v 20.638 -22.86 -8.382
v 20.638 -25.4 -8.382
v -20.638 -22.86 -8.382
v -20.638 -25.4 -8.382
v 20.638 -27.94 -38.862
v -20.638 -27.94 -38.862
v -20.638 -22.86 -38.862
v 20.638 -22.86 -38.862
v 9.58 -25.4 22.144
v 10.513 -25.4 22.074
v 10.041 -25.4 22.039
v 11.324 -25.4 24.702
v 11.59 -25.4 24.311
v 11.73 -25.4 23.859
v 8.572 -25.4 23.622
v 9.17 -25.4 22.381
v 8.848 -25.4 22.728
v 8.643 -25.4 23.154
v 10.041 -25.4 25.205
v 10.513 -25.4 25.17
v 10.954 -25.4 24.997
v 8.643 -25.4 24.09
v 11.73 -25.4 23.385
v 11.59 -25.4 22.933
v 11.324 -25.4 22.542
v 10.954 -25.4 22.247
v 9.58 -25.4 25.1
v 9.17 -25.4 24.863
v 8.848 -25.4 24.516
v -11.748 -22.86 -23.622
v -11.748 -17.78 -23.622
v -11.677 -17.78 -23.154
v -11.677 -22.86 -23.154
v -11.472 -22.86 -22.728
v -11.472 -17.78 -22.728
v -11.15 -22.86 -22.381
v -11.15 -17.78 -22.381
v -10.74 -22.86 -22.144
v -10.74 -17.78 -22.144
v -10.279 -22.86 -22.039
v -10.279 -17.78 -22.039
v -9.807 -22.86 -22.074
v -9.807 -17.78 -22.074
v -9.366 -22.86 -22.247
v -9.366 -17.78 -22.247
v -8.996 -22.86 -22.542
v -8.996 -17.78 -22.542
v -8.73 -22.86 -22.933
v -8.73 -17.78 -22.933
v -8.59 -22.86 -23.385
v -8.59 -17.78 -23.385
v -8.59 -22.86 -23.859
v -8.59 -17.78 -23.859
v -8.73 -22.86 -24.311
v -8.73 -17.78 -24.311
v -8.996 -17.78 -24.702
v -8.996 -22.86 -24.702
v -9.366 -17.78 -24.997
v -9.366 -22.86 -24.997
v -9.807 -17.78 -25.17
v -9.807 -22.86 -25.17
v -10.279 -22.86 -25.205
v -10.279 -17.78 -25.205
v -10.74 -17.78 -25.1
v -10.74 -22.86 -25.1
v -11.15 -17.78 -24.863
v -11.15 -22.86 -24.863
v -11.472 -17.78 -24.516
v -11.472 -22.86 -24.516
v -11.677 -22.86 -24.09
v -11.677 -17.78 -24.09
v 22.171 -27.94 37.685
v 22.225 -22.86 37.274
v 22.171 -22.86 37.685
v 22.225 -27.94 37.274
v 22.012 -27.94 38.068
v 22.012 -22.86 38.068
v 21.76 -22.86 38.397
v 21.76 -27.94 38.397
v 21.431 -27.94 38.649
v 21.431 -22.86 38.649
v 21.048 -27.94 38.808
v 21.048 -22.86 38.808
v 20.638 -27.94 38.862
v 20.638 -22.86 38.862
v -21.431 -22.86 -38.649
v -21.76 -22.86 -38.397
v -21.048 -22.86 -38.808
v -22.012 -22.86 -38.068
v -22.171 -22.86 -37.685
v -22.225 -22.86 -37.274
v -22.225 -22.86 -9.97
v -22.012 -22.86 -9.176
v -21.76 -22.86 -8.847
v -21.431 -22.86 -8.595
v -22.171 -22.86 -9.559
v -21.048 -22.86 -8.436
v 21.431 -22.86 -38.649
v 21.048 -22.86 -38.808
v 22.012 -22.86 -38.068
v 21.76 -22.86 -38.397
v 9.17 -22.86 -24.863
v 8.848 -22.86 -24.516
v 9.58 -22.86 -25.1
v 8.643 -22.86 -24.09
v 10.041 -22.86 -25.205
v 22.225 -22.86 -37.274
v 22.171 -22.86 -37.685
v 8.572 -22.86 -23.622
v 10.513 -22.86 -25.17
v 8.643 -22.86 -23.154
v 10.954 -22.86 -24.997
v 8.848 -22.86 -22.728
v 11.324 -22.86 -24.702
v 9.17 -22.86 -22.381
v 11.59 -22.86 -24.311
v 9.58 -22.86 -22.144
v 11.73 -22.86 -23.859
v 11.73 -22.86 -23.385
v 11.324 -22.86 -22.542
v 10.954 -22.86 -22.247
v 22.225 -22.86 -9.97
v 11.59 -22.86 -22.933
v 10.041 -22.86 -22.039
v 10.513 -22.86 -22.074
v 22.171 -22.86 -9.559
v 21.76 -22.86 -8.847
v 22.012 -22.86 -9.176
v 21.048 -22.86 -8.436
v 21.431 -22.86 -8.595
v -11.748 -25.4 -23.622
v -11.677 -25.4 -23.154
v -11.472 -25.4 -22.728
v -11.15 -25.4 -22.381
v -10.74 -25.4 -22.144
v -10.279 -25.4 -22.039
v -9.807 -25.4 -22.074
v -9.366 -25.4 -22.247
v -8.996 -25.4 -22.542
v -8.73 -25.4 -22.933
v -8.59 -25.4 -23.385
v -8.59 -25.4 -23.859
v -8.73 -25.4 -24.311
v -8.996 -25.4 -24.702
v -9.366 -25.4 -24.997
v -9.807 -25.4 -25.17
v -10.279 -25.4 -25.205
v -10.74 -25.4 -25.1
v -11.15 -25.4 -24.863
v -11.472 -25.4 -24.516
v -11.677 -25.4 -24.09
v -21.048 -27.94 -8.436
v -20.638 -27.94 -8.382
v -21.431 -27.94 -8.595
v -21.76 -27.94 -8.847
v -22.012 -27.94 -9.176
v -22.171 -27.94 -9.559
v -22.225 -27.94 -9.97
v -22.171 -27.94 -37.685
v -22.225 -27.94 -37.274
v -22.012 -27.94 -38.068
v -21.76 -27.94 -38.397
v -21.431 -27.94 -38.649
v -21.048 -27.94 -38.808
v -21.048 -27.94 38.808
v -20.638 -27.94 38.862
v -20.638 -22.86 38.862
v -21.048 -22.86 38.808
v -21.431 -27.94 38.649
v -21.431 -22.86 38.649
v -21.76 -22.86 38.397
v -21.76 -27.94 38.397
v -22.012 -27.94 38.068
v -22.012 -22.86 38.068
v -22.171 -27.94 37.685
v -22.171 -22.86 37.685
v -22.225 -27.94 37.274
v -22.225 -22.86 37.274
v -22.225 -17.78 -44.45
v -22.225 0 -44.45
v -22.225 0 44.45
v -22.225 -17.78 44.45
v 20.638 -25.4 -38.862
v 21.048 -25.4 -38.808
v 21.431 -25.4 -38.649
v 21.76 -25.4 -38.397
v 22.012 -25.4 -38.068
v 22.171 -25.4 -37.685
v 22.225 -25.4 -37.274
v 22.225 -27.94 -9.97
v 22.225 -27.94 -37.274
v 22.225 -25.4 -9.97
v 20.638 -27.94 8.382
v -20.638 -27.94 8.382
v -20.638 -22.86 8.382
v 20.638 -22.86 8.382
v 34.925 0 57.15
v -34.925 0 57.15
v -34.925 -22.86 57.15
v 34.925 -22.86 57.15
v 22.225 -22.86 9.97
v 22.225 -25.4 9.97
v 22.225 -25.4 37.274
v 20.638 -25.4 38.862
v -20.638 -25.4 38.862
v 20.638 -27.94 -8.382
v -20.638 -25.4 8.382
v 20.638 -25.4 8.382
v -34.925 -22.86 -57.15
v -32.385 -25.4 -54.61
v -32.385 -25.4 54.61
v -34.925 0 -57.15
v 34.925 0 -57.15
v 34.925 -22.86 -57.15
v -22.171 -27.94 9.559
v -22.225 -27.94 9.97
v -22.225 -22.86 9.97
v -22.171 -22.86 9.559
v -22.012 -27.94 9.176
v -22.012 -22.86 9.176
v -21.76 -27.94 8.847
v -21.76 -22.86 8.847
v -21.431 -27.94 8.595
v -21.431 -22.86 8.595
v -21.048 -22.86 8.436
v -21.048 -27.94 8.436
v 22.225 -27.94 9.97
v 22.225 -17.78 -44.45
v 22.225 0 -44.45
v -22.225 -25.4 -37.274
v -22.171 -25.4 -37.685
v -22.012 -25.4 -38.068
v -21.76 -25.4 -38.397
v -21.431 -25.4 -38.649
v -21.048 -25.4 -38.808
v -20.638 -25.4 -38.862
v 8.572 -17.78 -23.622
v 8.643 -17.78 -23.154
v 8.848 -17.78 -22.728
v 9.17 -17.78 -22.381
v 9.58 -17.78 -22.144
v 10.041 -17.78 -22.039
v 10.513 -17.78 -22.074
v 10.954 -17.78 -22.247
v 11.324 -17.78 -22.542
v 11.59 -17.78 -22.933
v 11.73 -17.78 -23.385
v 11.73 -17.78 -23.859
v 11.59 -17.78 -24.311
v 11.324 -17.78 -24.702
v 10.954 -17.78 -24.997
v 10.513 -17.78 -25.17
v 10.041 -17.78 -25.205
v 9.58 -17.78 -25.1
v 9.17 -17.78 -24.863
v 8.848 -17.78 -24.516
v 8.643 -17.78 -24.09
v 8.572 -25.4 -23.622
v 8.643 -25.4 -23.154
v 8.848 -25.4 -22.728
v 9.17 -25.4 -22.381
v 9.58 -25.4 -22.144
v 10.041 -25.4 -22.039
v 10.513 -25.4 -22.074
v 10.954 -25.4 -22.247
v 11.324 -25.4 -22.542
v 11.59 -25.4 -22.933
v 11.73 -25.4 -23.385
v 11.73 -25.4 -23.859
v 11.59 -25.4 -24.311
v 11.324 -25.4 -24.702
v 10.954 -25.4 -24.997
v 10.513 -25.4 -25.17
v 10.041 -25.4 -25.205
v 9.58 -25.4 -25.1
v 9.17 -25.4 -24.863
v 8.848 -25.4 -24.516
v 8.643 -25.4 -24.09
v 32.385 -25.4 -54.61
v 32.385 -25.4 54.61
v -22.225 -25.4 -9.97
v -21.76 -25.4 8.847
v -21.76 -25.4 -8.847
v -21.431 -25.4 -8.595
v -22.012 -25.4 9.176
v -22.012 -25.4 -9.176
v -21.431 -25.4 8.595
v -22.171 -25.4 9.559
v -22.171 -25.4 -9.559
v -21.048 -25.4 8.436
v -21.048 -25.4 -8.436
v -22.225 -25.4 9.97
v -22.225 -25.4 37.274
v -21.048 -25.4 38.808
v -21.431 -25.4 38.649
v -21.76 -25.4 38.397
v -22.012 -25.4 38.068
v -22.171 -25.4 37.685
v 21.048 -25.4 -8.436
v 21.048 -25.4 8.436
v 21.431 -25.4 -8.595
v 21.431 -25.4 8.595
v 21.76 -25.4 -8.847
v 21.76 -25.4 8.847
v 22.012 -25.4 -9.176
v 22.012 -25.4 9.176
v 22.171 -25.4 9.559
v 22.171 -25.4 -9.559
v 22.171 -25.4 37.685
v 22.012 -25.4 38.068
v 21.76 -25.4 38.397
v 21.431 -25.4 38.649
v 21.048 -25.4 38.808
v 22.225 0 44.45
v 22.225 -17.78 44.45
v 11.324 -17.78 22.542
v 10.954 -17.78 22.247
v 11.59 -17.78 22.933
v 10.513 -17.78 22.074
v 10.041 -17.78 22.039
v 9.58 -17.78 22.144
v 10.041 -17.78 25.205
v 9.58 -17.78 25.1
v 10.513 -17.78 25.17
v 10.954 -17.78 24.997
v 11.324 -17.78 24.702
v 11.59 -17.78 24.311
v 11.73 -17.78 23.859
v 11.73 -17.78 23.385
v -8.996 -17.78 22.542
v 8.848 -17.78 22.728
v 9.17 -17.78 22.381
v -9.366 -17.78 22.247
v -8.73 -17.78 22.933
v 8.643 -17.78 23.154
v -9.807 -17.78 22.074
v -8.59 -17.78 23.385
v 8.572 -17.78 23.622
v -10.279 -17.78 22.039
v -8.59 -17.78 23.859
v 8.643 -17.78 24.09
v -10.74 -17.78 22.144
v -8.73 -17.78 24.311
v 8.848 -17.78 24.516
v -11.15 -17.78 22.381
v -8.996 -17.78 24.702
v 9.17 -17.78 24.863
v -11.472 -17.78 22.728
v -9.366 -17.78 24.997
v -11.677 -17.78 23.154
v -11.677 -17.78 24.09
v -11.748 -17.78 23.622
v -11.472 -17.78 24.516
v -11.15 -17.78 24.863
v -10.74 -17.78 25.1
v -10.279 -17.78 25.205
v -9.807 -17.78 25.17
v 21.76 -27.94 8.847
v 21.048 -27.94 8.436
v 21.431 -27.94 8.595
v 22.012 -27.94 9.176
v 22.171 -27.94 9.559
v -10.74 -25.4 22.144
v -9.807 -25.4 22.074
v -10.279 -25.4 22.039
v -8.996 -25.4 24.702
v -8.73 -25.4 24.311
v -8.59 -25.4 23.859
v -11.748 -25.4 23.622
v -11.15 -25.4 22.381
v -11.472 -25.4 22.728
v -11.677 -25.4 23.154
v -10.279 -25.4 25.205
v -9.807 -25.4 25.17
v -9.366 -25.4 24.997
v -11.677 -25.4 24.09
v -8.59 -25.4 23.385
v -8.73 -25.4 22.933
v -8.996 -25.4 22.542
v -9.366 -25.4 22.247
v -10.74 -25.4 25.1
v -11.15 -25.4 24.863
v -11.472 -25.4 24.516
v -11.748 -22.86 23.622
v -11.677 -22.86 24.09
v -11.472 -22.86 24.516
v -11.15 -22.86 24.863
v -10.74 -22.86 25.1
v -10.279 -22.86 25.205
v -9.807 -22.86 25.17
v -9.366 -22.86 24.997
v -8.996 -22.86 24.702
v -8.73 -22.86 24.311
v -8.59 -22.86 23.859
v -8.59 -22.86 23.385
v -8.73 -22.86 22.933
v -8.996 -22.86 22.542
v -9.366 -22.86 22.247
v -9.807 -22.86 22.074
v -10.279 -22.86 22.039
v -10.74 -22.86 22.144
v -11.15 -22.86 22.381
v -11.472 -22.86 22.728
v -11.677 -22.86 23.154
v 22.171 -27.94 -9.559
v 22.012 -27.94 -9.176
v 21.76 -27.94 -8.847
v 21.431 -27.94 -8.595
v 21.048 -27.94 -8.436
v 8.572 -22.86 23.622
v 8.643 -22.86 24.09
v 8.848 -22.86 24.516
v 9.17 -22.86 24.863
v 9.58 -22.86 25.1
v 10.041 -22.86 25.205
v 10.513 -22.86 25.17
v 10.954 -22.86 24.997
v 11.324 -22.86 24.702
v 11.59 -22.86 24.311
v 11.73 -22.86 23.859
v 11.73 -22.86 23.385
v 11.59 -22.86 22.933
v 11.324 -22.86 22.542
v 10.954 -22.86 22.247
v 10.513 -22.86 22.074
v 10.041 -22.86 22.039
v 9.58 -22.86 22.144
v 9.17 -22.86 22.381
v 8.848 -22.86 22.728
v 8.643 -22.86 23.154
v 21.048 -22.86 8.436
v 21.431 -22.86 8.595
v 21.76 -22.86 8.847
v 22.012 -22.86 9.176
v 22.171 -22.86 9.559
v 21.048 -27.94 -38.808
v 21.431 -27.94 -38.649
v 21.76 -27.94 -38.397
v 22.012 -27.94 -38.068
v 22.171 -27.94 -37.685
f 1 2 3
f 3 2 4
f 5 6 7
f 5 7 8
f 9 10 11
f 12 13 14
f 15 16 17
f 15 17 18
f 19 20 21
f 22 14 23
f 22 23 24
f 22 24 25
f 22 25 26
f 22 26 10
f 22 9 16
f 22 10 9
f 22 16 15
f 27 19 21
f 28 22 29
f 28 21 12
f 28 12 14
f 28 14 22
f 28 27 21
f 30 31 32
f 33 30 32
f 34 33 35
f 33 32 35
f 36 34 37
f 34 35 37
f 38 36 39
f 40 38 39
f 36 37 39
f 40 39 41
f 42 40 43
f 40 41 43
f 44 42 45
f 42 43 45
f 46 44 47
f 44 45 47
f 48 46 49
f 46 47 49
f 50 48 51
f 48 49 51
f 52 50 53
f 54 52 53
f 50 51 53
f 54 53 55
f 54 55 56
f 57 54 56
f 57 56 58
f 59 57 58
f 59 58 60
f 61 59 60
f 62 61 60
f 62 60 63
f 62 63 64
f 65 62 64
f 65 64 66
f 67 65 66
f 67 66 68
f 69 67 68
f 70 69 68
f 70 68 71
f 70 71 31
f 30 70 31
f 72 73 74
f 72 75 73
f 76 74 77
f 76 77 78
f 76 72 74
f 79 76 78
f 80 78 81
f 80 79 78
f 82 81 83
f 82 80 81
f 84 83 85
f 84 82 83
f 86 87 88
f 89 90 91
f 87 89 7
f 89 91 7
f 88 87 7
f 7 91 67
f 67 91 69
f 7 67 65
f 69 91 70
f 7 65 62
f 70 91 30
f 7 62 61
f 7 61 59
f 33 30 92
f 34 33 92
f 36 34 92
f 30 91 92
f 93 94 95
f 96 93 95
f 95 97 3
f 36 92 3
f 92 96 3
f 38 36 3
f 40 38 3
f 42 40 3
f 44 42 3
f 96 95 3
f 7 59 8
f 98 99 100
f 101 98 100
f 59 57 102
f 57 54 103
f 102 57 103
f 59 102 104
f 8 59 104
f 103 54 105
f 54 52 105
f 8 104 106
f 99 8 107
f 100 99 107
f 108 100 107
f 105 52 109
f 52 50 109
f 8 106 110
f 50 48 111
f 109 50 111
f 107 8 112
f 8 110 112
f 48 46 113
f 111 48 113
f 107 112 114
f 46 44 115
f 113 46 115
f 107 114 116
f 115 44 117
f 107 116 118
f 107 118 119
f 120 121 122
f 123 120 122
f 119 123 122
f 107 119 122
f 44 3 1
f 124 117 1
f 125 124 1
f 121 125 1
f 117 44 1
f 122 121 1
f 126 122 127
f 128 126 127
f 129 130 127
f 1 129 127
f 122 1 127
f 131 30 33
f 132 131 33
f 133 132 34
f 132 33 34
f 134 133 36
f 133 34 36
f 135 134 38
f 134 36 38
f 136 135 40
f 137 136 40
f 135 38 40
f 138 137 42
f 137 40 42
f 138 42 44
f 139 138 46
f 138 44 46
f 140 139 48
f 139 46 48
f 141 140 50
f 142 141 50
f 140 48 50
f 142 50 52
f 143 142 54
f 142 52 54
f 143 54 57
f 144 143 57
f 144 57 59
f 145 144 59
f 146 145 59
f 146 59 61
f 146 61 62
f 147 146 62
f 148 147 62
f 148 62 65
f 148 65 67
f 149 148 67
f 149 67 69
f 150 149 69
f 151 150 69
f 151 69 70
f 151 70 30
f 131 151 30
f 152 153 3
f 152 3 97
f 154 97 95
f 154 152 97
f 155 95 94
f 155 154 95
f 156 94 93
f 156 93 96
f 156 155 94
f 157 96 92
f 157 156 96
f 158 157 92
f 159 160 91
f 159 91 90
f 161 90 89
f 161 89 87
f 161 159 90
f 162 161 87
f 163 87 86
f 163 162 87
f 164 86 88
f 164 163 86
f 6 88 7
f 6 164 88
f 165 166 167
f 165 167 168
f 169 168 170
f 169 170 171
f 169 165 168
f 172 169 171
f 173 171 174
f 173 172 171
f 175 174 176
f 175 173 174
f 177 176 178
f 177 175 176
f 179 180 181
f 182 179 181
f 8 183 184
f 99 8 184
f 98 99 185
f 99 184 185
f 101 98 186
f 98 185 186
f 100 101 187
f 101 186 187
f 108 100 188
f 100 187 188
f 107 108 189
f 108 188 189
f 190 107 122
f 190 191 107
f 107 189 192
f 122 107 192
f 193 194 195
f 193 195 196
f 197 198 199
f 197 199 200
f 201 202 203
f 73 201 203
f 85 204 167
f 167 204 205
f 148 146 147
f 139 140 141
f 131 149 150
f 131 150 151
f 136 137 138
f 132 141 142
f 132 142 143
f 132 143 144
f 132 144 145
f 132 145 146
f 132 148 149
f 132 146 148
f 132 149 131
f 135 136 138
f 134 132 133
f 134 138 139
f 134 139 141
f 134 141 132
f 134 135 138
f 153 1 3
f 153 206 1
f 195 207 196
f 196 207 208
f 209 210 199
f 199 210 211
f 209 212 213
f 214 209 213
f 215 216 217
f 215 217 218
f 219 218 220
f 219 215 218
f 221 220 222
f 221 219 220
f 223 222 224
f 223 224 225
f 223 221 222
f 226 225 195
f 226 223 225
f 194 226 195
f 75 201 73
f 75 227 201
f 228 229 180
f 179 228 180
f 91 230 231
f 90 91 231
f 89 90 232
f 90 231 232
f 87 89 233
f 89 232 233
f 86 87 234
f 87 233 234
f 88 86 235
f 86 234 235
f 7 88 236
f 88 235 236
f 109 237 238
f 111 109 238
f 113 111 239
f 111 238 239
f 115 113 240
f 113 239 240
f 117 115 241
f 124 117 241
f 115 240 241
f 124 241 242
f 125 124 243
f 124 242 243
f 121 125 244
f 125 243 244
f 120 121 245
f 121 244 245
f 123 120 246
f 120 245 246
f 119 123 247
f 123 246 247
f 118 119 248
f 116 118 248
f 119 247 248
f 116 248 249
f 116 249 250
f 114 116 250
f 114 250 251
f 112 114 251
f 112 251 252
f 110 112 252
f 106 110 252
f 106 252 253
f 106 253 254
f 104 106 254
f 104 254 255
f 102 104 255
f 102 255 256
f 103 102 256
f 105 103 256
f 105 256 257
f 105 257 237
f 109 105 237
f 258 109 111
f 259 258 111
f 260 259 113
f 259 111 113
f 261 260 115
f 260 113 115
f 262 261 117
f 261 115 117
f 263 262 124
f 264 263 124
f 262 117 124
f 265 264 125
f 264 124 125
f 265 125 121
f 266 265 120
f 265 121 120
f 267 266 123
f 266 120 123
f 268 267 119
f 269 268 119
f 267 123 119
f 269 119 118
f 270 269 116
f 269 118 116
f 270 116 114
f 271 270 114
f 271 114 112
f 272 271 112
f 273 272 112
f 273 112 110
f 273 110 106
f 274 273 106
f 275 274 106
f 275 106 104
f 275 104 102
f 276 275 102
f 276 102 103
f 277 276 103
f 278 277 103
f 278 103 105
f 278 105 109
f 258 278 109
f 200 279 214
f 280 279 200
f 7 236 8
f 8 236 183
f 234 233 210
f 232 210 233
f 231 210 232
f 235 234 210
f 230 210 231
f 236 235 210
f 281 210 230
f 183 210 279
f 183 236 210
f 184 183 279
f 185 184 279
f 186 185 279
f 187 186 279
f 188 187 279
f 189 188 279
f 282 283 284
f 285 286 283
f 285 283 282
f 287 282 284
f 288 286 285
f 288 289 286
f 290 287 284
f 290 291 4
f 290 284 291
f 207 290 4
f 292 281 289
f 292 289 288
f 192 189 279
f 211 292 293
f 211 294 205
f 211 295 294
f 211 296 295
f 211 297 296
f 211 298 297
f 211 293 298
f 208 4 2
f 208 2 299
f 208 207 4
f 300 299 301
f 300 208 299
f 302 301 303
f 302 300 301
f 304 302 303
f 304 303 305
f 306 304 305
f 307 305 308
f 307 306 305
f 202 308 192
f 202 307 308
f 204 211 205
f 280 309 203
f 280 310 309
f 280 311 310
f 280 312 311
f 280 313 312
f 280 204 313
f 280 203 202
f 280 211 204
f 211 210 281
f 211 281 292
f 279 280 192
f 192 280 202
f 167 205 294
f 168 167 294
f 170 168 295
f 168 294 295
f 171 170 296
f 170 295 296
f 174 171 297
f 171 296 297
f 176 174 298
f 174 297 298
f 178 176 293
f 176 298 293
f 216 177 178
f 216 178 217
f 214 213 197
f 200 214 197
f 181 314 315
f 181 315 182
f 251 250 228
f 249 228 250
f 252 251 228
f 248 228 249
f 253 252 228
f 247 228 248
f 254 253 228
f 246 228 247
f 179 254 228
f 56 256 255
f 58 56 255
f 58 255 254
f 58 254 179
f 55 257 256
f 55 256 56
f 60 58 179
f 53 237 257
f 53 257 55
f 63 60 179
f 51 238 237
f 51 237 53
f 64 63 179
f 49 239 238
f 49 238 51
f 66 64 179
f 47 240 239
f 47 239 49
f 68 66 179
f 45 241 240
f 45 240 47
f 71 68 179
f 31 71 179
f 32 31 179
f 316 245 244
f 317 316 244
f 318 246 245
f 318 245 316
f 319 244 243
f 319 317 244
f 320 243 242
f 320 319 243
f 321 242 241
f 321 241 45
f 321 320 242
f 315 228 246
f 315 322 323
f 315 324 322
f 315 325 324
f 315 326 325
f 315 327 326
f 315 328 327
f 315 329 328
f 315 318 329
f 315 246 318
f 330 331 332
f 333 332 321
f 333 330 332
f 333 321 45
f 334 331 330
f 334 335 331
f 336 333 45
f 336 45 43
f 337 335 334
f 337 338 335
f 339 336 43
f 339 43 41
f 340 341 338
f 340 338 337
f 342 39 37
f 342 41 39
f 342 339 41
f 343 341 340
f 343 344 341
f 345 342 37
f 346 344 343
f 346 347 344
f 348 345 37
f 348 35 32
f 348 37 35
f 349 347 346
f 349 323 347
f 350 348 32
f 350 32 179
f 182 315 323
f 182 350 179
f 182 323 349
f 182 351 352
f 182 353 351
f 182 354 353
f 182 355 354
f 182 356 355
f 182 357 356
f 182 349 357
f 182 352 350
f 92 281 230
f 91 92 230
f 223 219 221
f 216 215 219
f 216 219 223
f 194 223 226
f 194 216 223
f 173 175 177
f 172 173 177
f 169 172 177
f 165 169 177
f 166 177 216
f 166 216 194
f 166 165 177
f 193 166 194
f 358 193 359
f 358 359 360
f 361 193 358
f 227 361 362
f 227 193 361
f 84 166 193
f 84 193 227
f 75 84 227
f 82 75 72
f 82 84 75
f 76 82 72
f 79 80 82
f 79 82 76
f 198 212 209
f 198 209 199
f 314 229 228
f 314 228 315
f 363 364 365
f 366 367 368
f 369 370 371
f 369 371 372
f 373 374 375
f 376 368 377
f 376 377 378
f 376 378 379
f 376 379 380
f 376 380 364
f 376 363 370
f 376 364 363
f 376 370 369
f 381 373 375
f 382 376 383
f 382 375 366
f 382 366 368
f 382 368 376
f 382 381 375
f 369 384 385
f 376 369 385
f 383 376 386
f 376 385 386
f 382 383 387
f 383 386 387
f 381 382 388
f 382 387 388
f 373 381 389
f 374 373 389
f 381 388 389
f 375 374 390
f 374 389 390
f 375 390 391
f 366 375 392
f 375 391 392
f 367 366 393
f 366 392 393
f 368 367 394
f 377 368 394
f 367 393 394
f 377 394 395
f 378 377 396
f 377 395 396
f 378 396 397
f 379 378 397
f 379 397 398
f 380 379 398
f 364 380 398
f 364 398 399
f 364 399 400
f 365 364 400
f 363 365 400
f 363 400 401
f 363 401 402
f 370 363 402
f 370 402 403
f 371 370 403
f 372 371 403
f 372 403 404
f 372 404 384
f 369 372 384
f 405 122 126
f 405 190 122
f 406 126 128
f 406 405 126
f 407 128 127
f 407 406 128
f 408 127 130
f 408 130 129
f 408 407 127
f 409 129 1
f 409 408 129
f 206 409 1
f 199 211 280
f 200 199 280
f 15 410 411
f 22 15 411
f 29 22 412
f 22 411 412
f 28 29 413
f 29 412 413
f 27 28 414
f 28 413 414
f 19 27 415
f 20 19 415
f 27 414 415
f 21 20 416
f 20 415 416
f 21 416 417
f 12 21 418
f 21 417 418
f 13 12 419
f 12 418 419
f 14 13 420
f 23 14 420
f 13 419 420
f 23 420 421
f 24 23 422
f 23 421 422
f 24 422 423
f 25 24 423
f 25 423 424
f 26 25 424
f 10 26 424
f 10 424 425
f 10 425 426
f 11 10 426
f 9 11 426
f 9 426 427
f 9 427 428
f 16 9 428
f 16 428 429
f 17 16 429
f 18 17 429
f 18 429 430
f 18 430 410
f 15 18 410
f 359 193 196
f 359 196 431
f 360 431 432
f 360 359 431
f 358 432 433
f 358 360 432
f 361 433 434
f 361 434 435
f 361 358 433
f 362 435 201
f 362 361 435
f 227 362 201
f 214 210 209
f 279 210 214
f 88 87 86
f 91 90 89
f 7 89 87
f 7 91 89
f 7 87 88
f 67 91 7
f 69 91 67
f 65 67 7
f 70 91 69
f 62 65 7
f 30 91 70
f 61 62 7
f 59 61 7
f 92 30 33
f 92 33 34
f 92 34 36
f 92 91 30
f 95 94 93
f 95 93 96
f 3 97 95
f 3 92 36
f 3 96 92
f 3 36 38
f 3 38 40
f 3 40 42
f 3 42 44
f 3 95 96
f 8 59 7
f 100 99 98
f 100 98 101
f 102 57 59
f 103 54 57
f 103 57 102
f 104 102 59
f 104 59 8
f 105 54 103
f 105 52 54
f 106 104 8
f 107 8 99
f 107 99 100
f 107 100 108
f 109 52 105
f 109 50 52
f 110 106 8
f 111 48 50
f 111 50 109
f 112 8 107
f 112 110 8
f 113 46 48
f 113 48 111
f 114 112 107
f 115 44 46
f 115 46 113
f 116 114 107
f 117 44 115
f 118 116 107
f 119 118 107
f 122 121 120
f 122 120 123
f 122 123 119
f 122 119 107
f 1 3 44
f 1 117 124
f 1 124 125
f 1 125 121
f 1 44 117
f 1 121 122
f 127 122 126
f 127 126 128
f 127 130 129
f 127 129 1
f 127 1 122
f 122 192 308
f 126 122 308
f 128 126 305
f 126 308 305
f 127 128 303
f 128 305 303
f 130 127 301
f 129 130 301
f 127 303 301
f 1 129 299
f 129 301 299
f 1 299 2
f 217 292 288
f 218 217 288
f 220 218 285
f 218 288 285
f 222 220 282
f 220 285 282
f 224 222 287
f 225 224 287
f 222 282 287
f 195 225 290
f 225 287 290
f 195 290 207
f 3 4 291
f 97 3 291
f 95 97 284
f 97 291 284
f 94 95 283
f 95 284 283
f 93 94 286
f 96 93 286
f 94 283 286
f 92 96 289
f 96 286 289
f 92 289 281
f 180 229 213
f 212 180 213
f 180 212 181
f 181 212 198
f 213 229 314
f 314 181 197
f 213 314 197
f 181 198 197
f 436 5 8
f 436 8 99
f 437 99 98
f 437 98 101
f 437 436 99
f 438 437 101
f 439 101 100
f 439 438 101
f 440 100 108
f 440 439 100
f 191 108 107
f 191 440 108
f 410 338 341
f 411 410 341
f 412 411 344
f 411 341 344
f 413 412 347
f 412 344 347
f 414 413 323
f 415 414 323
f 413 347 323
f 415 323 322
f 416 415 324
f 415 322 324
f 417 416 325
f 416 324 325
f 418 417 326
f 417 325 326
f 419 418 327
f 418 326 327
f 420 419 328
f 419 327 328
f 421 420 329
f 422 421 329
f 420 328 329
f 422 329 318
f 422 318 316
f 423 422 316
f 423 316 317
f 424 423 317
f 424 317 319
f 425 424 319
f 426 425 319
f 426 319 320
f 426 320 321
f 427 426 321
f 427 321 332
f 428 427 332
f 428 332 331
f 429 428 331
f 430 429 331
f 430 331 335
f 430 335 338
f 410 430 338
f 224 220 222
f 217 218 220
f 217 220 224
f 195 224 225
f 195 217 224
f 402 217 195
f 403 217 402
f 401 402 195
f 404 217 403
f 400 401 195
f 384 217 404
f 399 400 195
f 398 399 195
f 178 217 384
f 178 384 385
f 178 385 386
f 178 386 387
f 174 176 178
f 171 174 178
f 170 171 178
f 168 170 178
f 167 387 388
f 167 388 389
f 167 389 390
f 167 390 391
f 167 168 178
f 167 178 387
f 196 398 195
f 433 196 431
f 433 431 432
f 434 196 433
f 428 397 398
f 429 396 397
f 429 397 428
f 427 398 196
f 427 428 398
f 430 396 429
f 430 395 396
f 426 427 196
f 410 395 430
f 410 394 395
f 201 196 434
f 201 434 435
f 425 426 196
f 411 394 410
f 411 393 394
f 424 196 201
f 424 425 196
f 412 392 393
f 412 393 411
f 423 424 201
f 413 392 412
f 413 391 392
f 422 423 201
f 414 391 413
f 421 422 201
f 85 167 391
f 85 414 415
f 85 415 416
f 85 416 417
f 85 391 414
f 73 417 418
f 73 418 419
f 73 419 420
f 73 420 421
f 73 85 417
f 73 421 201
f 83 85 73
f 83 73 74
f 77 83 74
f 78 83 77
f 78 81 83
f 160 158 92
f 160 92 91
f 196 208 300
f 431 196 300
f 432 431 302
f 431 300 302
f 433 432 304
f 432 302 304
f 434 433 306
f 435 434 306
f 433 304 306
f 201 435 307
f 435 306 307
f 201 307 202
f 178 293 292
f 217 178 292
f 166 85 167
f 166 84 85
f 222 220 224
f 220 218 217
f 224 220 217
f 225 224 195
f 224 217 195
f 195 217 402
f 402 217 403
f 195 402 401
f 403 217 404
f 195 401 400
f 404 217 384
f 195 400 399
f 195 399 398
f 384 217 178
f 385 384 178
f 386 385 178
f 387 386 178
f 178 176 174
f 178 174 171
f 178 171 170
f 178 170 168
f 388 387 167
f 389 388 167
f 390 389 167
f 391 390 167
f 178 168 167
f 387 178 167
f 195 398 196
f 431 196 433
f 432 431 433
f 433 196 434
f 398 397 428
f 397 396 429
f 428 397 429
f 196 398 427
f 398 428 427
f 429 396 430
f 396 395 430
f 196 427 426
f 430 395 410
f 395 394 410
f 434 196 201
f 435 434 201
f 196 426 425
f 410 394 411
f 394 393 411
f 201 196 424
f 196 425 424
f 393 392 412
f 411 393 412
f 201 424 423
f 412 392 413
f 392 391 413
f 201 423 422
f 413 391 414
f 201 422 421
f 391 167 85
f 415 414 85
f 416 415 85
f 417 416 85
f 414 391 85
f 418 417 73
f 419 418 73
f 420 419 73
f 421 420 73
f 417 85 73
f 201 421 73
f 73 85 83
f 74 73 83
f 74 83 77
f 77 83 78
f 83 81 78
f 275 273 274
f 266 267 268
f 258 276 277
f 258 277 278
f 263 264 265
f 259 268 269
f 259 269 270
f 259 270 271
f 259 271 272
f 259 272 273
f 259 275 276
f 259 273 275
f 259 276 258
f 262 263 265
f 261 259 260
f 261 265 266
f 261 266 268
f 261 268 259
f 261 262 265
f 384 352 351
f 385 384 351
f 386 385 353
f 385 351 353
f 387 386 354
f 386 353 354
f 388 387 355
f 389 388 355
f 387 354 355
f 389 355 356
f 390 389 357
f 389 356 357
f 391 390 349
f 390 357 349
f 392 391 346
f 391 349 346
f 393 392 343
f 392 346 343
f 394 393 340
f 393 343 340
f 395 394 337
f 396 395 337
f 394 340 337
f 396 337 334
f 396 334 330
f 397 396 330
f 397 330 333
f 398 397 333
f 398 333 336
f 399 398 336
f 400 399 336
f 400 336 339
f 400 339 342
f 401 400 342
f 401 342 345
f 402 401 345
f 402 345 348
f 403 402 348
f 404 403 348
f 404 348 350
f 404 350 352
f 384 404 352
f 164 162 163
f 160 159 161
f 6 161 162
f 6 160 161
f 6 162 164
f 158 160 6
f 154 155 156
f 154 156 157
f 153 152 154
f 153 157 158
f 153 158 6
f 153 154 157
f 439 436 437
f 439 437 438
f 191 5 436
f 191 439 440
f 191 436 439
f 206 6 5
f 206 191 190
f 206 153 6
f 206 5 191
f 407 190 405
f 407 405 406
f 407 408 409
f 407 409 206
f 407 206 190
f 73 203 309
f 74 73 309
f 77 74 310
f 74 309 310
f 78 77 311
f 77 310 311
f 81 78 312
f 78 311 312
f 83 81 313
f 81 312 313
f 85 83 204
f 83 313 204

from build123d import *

# Parameters (mm, degrees)
F0_W      = 69.85
F0_H      = 114.3
F1_DEPTH  = 25.4
F2_SIZE   = 2.54
F4_DEPTH  = 2.54
F5_DEPTH  = 2.54
F6_DEPTH  = 2.54
F7_DEPTH  = 2.54
F8_W      = 44.45
F8_H      = 88.9
F9_DEPTH  = 17.78
F10_R     = 1.5875
F11_DEPTH = 7.62


with BuildPart() as f1:
    # F0 (on Front) → F1 (new body)
    with BuildSketch(Plane.XZ):
        Rectangle(F0_W, F0_H)
    extrude(amount=F1_DEPTH)

    # F2
    f2_edges = [f1.edges().sort_by_distance(p)[0] for p in [
        (-34.925, -25.4, 0),
        (0, -25.4, 57.15),
        (34.925, -25.4, 0),
        (0, -25.4, -57.15),
    ]]
    chamfer(f2_edges, length=F2_SIZE)

    # F3 (on face) → F4 (cut)
    with BuildSketch(Plane.XZ.offset(25.4)):
        with BuildLine():
            Line((20.6375, 38.862), (-20.6375, 38.862))
            ThreePointArc((-20.6375, 38.862), (-21.7600320151, 38.3970320151), (-22.225, 37.2745))
            Line((-22.225, 37.2745), (-22.225, 9.9695))
            ThreePointArc((-22.225, 9.9695), (-21.7600320151, 8.8469679849), (-20.6375, 8.382))
            Line((-20.6375, 8.382), (20.6375, 8.382))
            ThreePointArc((20.6375, 8.382), (21.7600320151, 8.8469679849), (22.225, 9.9695))
            Line((22.225, 9.9695), (22.225, 37.2745))
            ThreePointArc((22.225, 37.2745), (21.7600320151, 38.3970320151), (20.6375, 38.862))
        make_face()
        with BuildLine():
            Line((20.6375, -8.382), (-20.6375, -8.382))
            ThreePointArc((-20.6375, -8.382), (-21.7600320151, -8.8469679849), (-22.225, -9.9695))
            Line((-22.225, -9.9695), (-22.225, -37.2745))
            ThreePointArc((-22.225, -37.2745), (-21.7600320151, -38.3970320151), (-20.6375, -38.862))
            Line((-20.6375, -38.862), (20.6375, -38.862))
            ThreePointArc((20.6375, -38.862), (21.7600320151, -38.3970320151), (22.225, -37.2745))
            Line((22.225, -37.2745), (22.225, -9.9695))
            ThreePointArc((22.225, -9.9695), (21.7600320151, -8.8469679849), (20.6375, -8.382))
        make_face()
    extrude(amount=-F4_DEPTH, mode=Mode.SUBTRACT)

    # F8 (on face) → F9 (cut)
    with BuildSketch(Plane(origin=(0, 0, 0), x_dir=(-1, 0, 0), z_dir=(0, 1, 0))):
        Rectangle(F8_W, F8_H)
    extrude(amount=-F9_DEPTH, mode=Mode.SUBTRACT)


with BuildPart() as f5:
    # F3 (on face) → F5 (new body)
    with BuildSketch(Plane.XZ.offset(25.4)):
        with BuildLine():
            Line((20.6375, 38.862), (-20.6375, 38.862))
            ThreePointArc((-20.6375, 38.862), (-21.7600320151, 38.3970320151), (-22.225, 37.2745))
            Line((-22.225, 37.2745), (-22.225, 9.9695))
            ThreePointArc((-22.225, 9.9695), (-21.7600320151, 8.8469679849), (-20.6375, 8.382))
            Line((-20.6375, 8.382), (20.6375, 8.382))
            ThreePointArc((20.6375, 8.382), (21.7600320151, 8.8469679849), (22.225, 9.9695))
            Line((22.225, 9.9695), (22.225, 37.2745))
            ThreePointArc((22.225, 37.2745), (21.7600320151, 38.3970320151), (20.6375, 38.862))
        make_face()
    extrude(amount=F5_DEPTH)

    # F3 (on face) → F6 (join)
    with BuildSketch(Plane.XZ.offset(25.4)):
        with BuildLine():
            Line((20.6375, 38.862), (-20.6375, 38.862))
            ThreePointArc((-20.6375, 38.862), (-21.7600320151, 38.3970320151), (-22.225, 37.2745))
            Line((-22.225, 37.2745), (-22.225, 9.9695))
            ThreePointArc((-22.225, 9.9695), (-21.7600320151, 8.8469679849), (-20.6375, 8.382))
            Line((-20.6375, 8.382), (20.6375, 8.382))
            ThreePointArc((20.6375, 8.382), (21.7600320151, 8.8469679849), (22.225, 9.9695))
            Line((22.225, 9.9695), (22.225, 37.2745))
            ThreePointArc((22.225, 37.2745), (21.7600320151, 38.3970320151), (20.6375, 38.862))
        make_face()
    extrude(amount=-F6_DEPTH)


with BuildPart() as f5b:
    # F3 (on face) → F5, piece 2 (new body)
    with BuildSketch(Plane.XZ.offset(25.4)):
        with BuildLine():
            Line((20.6375, -8.382), (-20.6375, -8.382))
            ThreePointArc((-20.6375, -8.382), (-21.7600320151, -8.8469679849), (-22.225, -9.9695))
            Line((-22.225, -9.9695), (-22.225, -37.2745))
            ThreePointArc((-22.225, -37.2745), (-21.7600320151, -38.3970320151), (-20.6375, -38.862))
            Line((-20.6375, -38.862), (20.6375, -38.862))
            ThreePointArc((20.6375, -38.862), (21.7600320151, -38.3970320151), (22.225, -37.2745))
            Line((22.225, -37.2745), (22.225, -9.9695))
            ThreePointArc((22.225, -9.9695), (21.7600320151, -8.8469679849), (20.6375, -8.382))
        make_face()
    extrude(amount=F5_DEPTH)

    # F3 (on face) → F7 (join)
    with BuildSketch(Plane.XZ.offset(25.4)):
        with BuildLine():
            Line((20.6375, -8.382), (-20.6375, -8.382))
            ThreePointArc((-20.6375, -8.382), (-21.7600320151, -8.8469679849), (-22.225, -9.9695))
            Line((-22.225, -9.9695), (-22.225, -37.2745))
            ThreePointArc((-22.225, -37.2745), (-21.7600320151, -38.3970320151), (-20.6375, -38.862))
            Line((-20.6375, -38.862), (20.6375, -38.862))
            ThreePointArc((20.6375, -38.862), (21.7600320151, -38.3970320151), (22.225, -37.2745))
            Line((22.225, -37.2745), (22.225, -9.9695))
            ThreePointArc((22.225, -9.9695), (21.7600320151, -8.8469679849), (20.6375, -8.382))
        make_face()
    extrude(amount=-F7_DEPTH)


with BuildPart() as f11_tool:
    # F10 (on face) → F11 (new body)
    with BuildSketch(Plane(origin=(0, -17.78, 0), x_dir=(-1, 0, 0), z_dir=(0, 1, 0))):
        with Locations((-10.16, 23.622)):
            Circle(F10_R)
        with Locations((10.16, 23.622)):
            Circle(F10_R)
        with Locations((-10.16, -23.622)):
            Circle(F10_R)
        with Locations((10.16, -23.622)):
            Circle(F10_R)
    extrude(amount=-F11_DEPTH)


with BuildPart() as f1_1:
    add(f1.part)

    # F11: cut by f11_tool
    add(f11_tool.part, mode=Mode.SUBTRACT)


with BuildPart() as f5_1:
    add(f5.part)

    # F11: cut by f11_tool
    add(f11_tool.part, mode=Mode.SUBTRACT)


with BuildPart() as f5b_1:
    add(f5b.part)

    # F11: cut by f11_tool
    add(f11_tool.part, mode=Mode.SUBTRACT)


solid = Compound([f1_1.part, f5_1.part, f5b_1.part])
